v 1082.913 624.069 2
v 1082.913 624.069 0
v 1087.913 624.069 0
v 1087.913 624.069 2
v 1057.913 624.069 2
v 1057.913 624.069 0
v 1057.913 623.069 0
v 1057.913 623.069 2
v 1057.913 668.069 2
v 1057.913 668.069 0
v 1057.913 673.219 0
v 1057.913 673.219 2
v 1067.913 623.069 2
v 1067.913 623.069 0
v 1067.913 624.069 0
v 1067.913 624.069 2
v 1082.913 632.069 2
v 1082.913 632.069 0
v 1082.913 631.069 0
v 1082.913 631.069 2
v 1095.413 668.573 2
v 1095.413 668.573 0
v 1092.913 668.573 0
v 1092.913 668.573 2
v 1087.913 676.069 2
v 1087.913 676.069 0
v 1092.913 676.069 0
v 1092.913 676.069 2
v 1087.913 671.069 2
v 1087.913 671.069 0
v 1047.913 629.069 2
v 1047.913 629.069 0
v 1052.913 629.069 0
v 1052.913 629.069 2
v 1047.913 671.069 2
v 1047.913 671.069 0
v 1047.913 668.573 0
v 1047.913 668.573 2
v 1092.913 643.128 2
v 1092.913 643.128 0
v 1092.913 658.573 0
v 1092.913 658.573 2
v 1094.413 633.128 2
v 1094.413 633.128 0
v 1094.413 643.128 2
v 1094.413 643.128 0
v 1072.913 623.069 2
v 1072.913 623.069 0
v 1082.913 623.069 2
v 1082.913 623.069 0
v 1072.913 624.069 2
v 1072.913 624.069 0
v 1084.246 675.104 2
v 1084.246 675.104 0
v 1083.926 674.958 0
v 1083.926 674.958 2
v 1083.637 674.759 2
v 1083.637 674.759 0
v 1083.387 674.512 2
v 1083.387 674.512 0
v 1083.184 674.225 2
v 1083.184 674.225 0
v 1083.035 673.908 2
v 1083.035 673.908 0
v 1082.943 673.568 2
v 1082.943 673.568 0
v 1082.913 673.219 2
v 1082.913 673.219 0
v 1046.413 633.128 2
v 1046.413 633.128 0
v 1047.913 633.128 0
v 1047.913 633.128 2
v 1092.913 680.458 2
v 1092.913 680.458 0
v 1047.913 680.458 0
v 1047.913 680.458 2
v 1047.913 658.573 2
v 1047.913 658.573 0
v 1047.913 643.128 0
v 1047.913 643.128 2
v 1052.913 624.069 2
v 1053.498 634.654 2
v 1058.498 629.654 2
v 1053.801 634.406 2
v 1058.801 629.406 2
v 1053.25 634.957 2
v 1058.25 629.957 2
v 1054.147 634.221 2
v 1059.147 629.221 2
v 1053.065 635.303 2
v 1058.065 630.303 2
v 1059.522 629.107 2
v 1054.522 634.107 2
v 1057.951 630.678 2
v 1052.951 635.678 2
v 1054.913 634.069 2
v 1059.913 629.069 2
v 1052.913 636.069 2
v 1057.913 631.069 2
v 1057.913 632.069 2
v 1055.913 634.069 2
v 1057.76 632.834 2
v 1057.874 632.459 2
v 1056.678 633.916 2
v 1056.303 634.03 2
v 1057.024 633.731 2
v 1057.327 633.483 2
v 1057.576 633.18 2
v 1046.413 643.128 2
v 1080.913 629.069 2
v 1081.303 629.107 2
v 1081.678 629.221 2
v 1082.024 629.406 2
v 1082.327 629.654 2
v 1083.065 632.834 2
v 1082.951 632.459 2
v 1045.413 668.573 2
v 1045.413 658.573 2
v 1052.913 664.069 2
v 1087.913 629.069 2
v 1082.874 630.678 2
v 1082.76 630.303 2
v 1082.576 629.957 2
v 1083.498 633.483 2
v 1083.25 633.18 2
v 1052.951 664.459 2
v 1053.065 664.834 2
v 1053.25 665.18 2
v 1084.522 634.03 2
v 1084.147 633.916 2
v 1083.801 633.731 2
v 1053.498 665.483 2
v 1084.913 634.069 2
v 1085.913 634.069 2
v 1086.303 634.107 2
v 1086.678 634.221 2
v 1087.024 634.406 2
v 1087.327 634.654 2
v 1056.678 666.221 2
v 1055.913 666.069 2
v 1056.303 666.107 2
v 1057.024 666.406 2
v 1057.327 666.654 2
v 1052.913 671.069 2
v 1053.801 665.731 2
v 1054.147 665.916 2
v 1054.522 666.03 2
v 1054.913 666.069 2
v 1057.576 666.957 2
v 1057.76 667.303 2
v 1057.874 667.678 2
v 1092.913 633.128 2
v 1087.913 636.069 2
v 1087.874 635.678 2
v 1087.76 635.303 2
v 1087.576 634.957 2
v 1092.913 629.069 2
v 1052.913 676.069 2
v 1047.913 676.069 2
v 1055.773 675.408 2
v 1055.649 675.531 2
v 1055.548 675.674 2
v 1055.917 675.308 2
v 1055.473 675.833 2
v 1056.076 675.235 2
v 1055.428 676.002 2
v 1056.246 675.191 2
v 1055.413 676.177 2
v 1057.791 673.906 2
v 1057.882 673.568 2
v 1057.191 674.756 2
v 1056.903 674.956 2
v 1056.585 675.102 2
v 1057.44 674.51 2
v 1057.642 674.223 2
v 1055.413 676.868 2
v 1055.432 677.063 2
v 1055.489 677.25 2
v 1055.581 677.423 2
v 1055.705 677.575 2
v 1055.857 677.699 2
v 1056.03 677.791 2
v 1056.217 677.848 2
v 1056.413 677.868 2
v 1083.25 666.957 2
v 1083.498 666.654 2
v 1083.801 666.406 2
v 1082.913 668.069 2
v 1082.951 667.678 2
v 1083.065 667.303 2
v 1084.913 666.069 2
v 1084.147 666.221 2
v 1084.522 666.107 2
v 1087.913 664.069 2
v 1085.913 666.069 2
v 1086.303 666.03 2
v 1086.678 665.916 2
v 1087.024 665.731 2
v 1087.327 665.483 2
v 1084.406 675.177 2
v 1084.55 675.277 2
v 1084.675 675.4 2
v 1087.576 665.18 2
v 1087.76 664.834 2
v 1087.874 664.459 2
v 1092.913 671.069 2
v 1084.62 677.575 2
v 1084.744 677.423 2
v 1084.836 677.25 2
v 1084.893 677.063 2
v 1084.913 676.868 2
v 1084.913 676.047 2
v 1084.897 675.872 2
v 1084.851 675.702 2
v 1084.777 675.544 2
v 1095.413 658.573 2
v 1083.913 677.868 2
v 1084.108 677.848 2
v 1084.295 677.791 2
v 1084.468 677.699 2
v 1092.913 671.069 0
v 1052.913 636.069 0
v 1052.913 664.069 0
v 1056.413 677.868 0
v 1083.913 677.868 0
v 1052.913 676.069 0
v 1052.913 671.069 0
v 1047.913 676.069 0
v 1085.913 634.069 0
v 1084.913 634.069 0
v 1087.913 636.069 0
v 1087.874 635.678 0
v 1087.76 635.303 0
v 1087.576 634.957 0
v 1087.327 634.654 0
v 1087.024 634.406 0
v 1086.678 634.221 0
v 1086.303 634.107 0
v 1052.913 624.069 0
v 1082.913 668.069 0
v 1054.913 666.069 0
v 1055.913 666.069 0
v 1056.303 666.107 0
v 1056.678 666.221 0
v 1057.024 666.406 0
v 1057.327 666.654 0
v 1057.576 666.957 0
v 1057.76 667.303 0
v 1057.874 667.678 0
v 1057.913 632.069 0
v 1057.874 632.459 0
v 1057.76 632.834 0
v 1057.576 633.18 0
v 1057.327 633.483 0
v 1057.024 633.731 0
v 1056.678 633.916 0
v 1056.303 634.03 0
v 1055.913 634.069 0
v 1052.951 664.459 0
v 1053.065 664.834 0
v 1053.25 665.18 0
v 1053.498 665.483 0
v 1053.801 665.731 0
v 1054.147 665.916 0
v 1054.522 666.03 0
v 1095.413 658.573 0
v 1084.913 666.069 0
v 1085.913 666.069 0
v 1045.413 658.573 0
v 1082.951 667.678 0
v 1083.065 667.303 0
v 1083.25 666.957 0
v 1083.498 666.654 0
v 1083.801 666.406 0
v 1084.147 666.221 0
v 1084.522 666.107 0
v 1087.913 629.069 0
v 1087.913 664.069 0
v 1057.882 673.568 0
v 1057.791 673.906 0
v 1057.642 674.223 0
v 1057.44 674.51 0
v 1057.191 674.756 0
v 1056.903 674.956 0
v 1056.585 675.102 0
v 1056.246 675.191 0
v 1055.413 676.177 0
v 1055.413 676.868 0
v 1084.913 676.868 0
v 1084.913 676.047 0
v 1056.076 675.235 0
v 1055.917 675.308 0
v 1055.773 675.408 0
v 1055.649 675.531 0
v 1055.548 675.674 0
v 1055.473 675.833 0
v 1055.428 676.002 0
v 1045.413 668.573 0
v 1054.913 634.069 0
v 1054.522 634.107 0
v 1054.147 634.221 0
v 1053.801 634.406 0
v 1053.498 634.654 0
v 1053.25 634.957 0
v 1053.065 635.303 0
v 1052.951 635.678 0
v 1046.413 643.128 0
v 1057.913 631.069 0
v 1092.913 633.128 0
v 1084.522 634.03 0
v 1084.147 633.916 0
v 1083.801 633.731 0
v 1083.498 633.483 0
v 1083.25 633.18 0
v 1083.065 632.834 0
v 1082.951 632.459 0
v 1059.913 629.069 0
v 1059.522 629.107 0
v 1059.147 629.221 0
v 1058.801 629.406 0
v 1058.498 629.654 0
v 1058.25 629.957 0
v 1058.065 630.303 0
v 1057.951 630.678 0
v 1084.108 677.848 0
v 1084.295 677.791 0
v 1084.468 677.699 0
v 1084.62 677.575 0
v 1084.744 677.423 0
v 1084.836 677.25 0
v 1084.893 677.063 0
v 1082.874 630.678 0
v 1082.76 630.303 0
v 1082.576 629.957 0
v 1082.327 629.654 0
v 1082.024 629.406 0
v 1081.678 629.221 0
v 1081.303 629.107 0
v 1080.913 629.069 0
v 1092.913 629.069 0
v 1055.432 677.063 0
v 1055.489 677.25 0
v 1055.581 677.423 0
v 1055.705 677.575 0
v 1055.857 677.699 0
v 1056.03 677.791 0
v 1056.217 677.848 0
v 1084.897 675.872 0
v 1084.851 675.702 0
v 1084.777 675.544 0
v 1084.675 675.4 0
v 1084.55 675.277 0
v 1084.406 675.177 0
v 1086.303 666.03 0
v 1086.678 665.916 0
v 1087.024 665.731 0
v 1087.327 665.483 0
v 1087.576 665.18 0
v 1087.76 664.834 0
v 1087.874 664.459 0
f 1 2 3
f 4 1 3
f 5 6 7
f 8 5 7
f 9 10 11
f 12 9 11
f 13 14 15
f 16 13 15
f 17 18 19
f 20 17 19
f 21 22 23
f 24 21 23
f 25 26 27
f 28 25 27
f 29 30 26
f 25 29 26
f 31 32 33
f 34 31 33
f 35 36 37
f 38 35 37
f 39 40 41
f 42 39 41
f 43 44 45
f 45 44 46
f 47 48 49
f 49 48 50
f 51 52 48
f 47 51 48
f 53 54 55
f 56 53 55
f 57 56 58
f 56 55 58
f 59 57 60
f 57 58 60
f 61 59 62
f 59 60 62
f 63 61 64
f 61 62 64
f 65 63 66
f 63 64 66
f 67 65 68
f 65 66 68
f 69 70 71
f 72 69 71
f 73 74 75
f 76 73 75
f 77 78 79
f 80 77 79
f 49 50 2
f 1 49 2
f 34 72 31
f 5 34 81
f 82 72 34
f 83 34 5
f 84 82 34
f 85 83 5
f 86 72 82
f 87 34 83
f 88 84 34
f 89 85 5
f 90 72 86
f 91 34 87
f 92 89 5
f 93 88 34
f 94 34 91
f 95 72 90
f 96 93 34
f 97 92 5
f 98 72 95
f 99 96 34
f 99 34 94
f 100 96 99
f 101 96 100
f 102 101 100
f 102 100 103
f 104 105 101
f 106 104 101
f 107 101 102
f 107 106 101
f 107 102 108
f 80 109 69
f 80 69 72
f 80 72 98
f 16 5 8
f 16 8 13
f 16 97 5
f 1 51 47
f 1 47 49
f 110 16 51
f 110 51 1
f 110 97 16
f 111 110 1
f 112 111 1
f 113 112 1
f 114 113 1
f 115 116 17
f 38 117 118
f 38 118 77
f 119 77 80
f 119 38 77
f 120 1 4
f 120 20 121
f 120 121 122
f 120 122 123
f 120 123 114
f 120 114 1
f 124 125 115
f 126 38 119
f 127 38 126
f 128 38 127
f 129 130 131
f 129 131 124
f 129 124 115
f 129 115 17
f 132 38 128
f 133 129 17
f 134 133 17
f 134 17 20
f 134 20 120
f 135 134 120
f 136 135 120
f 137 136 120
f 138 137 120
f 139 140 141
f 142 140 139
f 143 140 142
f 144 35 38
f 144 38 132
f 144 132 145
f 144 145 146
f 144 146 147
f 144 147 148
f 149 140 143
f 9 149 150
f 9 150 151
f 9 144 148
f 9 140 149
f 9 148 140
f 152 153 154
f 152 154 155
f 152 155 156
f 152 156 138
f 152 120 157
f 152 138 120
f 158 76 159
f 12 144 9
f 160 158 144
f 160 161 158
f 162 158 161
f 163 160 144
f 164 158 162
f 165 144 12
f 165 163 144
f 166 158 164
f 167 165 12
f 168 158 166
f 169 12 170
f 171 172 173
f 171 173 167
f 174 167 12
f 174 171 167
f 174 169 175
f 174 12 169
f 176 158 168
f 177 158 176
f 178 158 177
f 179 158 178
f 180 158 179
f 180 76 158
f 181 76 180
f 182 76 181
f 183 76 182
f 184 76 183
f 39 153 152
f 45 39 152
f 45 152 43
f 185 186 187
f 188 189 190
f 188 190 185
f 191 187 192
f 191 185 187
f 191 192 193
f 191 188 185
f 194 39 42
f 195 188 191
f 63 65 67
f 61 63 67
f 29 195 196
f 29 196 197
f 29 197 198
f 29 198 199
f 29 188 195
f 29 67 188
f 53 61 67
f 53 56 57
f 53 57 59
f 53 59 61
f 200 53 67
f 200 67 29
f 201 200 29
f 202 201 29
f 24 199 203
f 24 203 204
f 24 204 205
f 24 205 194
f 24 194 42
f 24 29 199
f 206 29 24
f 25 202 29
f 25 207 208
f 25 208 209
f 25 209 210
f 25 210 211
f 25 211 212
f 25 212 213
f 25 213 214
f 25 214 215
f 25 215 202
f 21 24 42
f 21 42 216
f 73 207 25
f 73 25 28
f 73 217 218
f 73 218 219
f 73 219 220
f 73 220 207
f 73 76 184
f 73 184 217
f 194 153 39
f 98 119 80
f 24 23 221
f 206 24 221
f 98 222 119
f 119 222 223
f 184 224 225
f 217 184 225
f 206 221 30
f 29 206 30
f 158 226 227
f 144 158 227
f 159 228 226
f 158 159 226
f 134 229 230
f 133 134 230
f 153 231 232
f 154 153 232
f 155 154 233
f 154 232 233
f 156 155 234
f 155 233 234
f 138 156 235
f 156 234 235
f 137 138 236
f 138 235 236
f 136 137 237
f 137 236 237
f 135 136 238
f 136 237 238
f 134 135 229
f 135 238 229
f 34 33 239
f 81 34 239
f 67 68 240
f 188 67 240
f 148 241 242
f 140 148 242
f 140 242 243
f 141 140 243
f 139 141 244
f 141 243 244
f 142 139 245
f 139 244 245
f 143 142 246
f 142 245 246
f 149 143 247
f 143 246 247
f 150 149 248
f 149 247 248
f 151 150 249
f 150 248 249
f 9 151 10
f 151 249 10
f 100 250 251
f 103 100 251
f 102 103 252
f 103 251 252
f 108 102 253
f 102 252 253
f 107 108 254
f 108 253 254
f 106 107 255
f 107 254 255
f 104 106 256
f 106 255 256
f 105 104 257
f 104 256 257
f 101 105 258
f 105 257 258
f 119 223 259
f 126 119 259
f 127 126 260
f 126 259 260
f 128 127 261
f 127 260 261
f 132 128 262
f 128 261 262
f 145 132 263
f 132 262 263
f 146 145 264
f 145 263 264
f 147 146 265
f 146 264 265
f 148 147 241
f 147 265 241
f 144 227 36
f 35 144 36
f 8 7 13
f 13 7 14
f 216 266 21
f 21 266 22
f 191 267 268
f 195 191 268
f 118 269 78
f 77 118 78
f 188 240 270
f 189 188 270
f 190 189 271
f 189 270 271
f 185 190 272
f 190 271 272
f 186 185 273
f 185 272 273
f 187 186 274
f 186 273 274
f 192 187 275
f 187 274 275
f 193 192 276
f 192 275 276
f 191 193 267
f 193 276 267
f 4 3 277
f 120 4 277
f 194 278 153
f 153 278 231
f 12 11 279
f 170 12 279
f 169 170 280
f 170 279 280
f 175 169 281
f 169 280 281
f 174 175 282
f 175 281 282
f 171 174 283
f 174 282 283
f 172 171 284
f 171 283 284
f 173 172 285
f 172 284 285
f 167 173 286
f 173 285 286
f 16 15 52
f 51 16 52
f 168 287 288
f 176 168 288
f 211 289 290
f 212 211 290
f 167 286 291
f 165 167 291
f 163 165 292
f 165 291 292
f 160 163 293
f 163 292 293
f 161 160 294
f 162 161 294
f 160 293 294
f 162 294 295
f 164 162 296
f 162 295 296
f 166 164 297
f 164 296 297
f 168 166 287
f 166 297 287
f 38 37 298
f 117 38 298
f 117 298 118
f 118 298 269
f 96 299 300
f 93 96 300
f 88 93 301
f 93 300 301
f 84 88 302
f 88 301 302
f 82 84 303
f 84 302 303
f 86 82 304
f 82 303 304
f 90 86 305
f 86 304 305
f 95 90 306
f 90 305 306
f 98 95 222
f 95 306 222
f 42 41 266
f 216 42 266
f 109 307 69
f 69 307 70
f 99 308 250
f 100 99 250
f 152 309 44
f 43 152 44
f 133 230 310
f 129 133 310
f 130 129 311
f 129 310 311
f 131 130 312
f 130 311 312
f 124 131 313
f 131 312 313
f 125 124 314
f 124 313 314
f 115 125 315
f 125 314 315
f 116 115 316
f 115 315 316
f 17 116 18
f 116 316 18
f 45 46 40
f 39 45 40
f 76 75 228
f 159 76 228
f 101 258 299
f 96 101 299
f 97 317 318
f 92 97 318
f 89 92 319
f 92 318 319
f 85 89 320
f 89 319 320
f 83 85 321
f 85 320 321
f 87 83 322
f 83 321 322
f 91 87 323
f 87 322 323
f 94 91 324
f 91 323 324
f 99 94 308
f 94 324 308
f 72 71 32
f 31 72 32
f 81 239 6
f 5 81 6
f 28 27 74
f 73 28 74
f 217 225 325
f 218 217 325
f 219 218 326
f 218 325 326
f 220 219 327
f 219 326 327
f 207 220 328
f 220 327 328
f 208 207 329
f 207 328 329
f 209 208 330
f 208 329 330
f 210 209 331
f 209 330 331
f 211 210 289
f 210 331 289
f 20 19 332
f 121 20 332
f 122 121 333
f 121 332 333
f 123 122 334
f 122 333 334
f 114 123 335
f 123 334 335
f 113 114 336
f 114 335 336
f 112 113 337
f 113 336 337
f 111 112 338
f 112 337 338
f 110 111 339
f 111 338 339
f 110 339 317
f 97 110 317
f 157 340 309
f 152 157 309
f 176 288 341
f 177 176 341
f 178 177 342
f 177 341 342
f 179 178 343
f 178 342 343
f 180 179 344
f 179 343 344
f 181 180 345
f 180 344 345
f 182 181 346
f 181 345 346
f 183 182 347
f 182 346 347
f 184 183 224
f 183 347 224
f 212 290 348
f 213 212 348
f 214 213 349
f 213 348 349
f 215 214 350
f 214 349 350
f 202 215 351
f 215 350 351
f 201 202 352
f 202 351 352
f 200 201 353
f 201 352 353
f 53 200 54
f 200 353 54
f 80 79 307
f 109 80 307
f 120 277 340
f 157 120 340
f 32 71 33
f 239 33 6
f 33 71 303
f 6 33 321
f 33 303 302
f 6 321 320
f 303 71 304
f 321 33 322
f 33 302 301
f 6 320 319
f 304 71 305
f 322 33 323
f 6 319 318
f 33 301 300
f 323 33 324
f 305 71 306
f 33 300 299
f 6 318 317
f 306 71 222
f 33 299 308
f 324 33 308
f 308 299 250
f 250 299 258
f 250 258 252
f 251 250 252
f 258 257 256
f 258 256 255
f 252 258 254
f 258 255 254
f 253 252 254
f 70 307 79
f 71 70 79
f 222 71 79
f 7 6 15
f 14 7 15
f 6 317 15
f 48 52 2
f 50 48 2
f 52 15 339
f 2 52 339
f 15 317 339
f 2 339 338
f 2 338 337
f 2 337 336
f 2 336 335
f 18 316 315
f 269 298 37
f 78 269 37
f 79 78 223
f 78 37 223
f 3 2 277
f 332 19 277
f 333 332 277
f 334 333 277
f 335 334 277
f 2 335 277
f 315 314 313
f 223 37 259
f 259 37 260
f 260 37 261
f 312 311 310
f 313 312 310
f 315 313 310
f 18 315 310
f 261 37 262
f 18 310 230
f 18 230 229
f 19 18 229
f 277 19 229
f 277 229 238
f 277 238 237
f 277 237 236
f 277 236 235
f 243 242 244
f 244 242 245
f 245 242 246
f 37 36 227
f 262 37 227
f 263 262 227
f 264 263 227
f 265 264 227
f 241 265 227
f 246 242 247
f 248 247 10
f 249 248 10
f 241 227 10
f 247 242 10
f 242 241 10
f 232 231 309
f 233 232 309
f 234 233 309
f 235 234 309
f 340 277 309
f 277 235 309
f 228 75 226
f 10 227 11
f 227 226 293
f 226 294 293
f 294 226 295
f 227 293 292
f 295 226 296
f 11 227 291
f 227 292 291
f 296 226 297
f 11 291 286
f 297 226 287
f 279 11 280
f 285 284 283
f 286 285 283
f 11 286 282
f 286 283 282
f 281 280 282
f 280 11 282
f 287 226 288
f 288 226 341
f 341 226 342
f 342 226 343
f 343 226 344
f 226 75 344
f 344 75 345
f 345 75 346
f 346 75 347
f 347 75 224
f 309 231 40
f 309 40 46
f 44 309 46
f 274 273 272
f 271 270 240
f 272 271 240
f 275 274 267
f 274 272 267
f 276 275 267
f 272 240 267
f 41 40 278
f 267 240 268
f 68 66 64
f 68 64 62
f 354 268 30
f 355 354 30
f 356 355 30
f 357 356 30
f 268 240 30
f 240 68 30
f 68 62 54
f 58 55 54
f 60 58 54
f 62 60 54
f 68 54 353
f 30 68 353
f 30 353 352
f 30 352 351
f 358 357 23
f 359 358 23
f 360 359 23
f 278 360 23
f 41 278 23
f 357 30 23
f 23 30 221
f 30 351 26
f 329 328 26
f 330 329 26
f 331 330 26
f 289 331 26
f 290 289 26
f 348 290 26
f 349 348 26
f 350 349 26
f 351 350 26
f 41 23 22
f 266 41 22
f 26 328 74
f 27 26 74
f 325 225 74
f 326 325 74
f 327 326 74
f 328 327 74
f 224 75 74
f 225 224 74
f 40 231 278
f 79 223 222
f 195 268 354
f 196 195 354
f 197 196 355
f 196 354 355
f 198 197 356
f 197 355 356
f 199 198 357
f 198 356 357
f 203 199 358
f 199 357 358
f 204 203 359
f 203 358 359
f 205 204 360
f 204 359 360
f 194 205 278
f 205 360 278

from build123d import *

# Parameters (mm, degrees)
EXTRUDE_1_DEPTH = 2


with BuildPart() as part:
    # Model → 凸台-拉伸1 (new body)
    with BuildSketch(Plane.XY):
        Polygon((1047.912570376, 680.457705055), (1047.912570376, 676.068532902), (1052.912570376, 676.068532902), (1052.912570376, 671.068532902), (1047.912570376, 671.068532902), (1047.912570376, 668.573157352), (1045.412570376, 668.573157352), (1045.412570376, 658.573157352), (1047.912570376, 658.573157352), (1047.912570376, 643.128332902), (1046.412570376, 643.128332902), (1046.412570376, 633.128332902), (1047.912570376, 633.128332902), (1047.912570376, 629.068532902), (1052.912570376, 629.068532902), (1052.912570376, 624.068532902), (1057.912570376, 624.068532902), (1057.912570376, 623.068532902), (1067.912570376, 623.068532902), (1067.912570376, 624.068532902), (1072.912570376, 624.068532902), (1072.912570376, 623.068532902), (1082.912570376, 623.068532902), (1082.912570376, 624.068532902), (1087.912570376, 624.068532902), (1087.912570376, 629.068532902), (1092.912570376, 629.068532902), (1092.912570376, 633.128332902), (1094.412570376, 633.128332902), (1094.412570376, 643.128332902), (1092.912570376, 643.128332902), (1092.912570376, 658.573157352), (1095.412570376, 658.573157352), (1095.412570376, 668.573157352), (1092.912570376, 668.573157352), (1092.912570376, 671.068532902), (1087.912570376, 671.068532902), (1087.912570376, 676.068532902), (1092.912570376, 676.068532902), (1092.912570376, 680.457705055), align=None)
        with BuildLine():
            Line((1057.912570376, 668.068532902), (1057.912570376, 673.218532902))
            ThreePointArc((1057.912570376, 673.218532902), (1057.440095607, 674.509527351), (1056.245903709, 675.190559496))
            ThreePointArc((1056.245903709, 675.190559496), (1055.64880776, 675.531075569), (1055.412570376, 676.176572793))
            Line((1055.412570376, 676.176572793), (1055.412570376, 676.867577668))
            ThreePointArc((1055.412570376, 676.867577668), (1055.705463595, 677.57468445), (1056.412570376, 677.867577668))
            Line((1056.412570376, 677.867577668), (1083.912570376, 677.867577668))
            ThreePointArc((1083.912570376, 677.867577668), (1084.619677157, 677.57468445), (1084.912570376, 676.867577668))
            Line((1084.912570376, 676.867577668), (1084.912570376, 676.046960027))
            ThreePointArc((1084.912570376, 676.046960027), (1084.729066957, 675.469609757), (1084.245903709, 675.104150985))
            ThreePointArc((1084.245903709, 675.104150985), (1083.279577214, 674.37323344), (1082.912570376, 673.218532902))
            Line((1082.912570376, 673.218532902), (1082.912570376, 668.068532902))
            ThreePointArc((1082.912570376, 668.068532902), (1083.498356813, 666.65431934), (1084.912570376, 666.068532902))
            Line((1084.912570376, 666.068532902), (1085.912570376, 666.068532902))
            ThreePointArc((1085.912570376, 666.068532902), (1087.326783938, 665.482746464), (1087.912570376, 664.068532902))
            Line((1087.912570376, 664.068532902), (1087.912570376, 636.068532902))
            ThreePointArc((1087.912570376, 636.068532902), (1087.326783938, 634.65431934), (1085.912570376, 634.068532902))
            Line((1085.912570376, 634.068532902), (1084.912570376, 634.068532902))
            ThreePointArc((1084.912570376, 634.068532902), (1083.498356813, 633.482746464), (1082.912570376, 632.068532902))
            Line((1082.912570376, 632.068532902), (1082.912570376, 631.068532902))
            ThreePointArc((1082.912570376, 631.068532902), (1082.326783938, 629.65431934), (1080.912570376, 629.068532902))
            Line((1080.912570376, 629.068532902), (1059.912570376, 629.068532902))
            ThreePointArc((1059.912570376, 629.068532902), (1058.498356813, 629.65431934), (1057.912570376, 631.068532902))
            Line((1057.912570376, 631.068532902), (1057.912570376, 632.068532902))
            ThreePointArc((1057.912570376, 632.068532902), (1057.326783938, 633.482746464), (1055.912570376, 634.068532902))
            Line((1055.912570376, 634.068532902), (1054.912570376, 634.068532902))
            ThreePointArc((1054.912570376, 634.068532902), (1053.498356813, 634.65431934), (1052.912570376, 636.068532902))
            Line((1052.912570376, 636.068532902), (1052.912570376, 664.068532902))
            ThreePointArc((1052.912570376, 664.068532902), (1053.498356813, 665.482746464), (1054.912570376, 666.068532902))
            Line((1054.912570376, 666.068532902), (1055.912570376, 666.068532902))
            ThreePointArc((1055.912570376, 666.068532902), (1057.326783938, 666.65431934), (1057.912570376, 668.068532902))
        make_face(mode=Mode.SUBTRACT)
    extrude(amount=EXTRUDE_1_DEPTH)


solid = part.part
